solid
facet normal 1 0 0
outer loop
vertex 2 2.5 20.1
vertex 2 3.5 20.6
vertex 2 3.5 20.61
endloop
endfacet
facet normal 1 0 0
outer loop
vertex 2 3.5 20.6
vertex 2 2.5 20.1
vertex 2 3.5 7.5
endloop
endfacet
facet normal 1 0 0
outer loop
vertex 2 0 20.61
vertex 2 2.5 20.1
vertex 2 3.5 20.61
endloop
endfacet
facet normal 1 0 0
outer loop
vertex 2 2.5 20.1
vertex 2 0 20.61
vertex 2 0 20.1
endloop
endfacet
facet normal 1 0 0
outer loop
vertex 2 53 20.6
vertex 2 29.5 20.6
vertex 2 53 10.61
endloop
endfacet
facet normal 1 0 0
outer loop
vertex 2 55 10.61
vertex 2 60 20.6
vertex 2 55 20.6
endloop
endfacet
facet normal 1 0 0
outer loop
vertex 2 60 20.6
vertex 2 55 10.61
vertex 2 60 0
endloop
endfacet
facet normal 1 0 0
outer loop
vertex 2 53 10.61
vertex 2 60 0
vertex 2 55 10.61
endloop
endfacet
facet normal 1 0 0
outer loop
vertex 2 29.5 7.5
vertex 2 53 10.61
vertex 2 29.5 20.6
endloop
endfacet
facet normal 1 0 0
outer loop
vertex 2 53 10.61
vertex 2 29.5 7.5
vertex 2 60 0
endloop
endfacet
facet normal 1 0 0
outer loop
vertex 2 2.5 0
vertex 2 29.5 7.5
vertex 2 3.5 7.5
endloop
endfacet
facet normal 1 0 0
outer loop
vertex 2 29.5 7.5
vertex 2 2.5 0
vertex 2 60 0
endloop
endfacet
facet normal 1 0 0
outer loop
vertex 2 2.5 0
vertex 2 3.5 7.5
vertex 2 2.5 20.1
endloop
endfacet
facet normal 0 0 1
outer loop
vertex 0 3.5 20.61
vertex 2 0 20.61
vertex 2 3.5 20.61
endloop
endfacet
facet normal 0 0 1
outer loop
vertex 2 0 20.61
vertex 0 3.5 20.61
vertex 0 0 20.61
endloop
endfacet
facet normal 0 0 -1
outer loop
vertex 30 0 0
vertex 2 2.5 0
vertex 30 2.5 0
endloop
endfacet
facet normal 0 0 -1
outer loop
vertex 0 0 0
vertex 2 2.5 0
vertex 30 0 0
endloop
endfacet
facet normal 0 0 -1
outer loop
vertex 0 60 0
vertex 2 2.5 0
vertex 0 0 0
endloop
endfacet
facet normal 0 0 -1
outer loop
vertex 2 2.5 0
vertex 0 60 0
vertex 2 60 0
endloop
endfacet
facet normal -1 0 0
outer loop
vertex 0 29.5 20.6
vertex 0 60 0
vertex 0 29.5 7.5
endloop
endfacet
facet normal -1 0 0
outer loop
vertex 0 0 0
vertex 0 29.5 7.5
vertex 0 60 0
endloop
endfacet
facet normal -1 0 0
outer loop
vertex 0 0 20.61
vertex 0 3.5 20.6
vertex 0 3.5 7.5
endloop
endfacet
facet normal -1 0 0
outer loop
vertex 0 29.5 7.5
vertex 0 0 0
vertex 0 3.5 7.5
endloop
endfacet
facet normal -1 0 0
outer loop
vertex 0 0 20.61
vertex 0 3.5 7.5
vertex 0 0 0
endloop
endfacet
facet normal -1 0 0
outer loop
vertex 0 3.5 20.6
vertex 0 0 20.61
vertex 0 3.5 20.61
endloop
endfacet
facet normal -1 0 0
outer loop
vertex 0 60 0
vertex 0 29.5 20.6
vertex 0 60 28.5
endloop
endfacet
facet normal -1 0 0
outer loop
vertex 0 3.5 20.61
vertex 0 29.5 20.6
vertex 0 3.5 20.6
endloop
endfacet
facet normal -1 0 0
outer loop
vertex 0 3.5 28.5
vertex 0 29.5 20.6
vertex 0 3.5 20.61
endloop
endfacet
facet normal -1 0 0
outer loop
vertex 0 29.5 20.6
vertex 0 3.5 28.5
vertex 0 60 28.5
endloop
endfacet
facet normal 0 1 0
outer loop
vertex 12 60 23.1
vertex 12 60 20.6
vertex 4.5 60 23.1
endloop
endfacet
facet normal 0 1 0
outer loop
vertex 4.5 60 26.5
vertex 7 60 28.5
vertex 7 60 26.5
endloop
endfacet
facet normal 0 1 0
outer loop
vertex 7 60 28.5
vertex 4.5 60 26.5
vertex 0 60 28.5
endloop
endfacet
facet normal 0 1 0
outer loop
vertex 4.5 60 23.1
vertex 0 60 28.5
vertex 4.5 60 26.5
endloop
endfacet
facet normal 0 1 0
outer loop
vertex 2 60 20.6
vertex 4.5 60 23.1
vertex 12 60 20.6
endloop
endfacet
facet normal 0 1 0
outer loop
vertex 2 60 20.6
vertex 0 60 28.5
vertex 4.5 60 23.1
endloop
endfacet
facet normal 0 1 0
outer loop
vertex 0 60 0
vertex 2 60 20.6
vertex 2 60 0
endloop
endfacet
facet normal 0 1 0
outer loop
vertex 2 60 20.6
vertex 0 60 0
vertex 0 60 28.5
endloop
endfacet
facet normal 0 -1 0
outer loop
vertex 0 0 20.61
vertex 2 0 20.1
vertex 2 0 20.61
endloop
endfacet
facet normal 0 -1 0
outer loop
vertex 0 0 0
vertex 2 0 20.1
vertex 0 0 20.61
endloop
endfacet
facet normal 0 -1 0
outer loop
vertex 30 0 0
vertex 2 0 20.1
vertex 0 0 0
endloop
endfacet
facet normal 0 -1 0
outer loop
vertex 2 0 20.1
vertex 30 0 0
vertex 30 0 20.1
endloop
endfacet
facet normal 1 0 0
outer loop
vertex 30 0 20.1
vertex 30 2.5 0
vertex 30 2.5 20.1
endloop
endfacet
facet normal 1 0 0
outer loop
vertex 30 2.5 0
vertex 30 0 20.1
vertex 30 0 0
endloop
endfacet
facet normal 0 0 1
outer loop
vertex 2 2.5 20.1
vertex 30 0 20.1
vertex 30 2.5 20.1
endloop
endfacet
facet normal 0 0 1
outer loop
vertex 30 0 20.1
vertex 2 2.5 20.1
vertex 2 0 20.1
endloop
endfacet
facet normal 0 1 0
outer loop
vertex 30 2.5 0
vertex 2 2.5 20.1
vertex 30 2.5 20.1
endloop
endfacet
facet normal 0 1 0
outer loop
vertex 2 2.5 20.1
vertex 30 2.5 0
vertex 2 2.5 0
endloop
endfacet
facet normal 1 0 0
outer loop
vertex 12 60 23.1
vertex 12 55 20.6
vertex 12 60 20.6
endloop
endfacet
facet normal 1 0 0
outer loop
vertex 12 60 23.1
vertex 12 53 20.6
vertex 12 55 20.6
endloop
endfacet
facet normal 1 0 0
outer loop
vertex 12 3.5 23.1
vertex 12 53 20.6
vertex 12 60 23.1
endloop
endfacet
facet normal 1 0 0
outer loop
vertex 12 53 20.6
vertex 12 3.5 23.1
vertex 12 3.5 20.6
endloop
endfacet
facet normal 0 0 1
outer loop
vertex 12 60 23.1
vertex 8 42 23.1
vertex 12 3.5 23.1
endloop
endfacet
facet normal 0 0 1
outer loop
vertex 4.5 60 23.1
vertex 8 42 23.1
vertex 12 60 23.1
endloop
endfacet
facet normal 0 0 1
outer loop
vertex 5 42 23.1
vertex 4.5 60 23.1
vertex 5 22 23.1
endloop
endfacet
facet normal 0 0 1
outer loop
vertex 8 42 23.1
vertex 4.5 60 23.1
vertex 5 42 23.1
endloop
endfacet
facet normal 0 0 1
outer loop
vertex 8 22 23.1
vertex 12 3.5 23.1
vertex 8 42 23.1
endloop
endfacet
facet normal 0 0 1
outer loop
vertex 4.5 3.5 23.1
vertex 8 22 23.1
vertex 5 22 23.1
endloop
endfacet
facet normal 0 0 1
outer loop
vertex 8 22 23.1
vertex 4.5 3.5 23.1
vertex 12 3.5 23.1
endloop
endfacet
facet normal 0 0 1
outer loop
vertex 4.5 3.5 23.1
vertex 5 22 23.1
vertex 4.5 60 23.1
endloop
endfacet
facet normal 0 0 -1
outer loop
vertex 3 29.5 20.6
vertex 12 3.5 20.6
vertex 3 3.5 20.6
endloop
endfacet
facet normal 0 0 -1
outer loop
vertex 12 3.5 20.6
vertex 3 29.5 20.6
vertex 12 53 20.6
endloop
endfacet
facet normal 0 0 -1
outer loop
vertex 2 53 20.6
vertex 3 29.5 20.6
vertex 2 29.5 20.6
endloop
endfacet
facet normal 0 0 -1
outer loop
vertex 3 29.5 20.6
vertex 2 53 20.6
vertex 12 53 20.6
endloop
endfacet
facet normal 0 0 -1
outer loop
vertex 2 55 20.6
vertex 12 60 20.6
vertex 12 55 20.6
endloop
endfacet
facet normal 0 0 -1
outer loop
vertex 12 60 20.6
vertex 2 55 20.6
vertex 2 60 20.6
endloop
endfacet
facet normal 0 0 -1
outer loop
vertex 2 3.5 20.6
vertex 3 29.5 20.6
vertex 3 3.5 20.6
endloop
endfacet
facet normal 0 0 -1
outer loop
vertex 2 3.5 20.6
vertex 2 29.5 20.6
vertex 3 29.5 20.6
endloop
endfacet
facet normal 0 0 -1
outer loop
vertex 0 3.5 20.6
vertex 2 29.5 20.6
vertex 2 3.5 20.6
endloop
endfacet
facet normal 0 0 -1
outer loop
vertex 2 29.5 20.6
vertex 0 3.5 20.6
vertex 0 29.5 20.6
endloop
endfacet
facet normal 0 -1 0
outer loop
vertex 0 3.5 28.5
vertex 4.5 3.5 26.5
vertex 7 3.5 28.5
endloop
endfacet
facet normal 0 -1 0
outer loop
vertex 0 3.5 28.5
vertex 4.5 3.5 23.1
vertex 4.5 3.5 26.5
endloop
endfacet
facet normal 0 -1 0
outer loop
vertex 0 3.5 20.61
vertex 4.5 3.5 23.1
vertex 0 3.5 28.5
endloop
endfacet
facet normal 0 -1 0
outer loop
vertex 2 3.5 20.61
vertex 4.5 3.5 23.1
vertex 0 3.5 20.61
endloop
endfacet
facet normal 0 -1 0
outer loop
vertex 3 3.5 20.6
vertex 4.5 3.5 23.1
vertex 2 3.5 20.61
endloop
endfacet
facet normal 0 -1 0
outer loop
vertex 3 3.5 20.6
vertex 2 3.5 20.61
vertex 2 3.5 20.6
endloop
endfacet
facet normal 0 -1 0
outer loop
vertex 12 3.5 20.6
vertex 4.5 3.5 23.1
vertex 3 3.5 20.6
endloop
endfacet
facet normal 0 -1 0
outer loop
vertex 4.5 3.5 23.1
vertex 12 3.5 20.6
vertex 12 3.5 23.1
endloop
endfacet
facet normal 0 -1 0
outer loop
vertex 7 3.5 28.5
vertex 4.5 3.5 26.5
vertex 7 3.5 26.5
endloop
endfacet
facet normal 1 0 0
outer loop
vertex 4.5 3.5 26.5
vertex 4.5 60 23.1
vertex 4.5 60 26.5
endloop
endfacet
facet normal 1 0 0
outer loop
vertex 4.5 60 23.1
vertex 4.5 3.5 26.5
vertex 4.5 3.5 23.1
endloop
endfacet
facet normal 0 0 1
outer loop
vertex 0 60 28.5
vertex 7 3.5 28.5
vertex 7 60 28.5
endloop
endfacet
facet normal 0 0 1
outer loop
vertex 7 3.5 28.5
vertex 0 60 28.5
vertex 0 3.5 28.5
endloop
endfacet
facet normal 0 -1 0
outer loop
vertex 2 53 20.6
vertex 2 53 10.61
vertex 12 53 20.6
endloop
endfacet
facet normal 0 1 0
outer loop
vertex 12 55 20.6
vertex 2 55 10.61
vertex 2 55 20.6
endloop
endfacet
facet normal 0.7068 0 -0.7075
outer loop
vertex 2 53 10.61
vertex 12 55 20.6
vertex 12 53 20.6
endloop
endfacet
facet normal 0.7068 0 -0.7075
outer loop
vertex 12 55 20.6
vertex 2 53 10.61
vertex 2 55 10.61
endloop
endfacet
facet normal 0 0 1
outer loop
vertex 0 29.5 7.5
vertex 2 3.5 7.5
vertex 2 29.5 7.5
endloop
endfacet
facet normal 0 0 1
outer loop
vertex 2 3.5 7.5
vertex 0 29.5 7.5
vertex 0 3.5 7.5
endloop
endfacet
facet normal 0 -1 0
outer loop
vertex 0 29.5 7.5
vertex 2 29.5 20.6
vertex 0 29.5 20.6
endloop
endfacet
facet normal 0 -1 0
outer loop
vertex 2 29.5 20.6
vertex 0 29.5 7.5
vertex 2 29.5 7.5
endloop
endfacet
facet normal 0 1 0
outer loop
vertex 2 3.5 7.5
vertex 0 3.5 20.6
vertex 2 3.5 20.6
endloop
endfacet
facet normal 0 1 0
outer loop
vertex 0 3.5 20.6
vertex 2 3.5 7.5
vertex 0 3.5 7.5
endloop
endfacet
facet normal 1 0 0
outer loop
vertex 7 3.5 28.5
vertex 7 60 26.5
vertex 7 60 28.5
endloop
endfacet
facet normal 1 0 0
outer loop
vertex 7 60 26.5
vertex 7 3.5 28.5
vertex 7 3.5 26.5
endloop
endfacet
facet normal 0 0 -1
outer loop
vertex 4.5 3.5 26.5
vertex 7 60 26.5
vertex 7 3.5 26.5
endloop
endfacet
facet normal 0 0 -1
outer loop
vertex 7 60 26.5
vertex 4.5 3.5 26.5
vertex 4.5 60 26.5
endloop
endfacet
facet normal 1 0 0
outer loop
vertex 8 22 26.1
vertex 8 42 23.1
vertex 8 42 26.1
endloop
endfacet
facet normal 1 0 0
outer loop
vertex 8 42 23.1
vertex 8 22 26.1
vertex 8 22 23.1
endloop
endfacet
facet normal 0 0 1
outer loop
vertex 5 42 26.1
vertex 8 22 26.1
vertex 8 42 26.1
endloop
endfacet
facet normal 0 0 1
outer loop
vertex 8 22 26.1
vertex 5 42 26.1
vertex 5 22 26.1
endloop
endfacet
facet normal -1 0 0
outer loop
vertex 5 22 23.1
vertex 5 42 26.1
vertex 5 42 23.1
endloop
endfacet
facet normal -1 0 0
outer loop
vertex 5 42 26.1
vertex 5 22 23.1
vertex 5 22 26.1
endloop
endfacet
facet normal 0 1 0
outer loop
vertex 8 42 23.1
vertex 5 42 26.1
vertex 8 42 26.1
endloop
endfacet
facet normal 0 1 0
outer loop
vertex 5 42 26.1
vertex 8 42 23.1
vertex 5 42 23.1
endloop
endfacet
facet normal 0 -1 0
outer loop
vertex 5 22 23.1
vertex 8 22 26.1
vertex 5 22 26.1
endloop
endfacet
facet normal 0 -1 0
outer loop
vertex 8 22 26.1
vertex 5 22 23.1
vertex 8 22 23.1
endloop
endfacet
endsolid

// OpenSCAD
// file: _review.scad
// Shared by the review protos: the colours of a before/after pair.  The part in a neutral grey-blue, the
// geometry a proposal changes in the accent, the parts it mates with in a translucent grey.
NEUTRAL = "#b9c6d6";
ACCENT = "#ff7a1a";
MATE = "#6f7782";
MATE_A = 0.45;
PCB = "#2f6f4f";
module part() color(NEUTRAL) children();
module changed() color(ACCENT) children();
module mate(a = MATE_A) color(MATE, a) children();
// main file
// Review proto (not a part): a tray's left guide seen as a section (a 60 mm slice behind the fascia, front
// view), with the drawer's flange in it.  Today the lip's underside is a flat 2.5 mm shelf in the air along
// the whole tray, and the ledge's first 48 mm have no gusset (the row cable's window skips the ones at y 5
// and 29).  Proposed (accent): the lip's underside at 45° from its tip (the tip keeps the flange's 0.4 mm),
// a gusset at y 10, the fascia raised under the ledge.  docs/printed-parts-review.md › Tray.
//
//   openscad -D 'VIEW="today"' -o tray_guide_today.png mechanical/review/proto/tray_guide.scad
include <_review.scad>
VIEW = "today";
WALL = 2; LEDGE_X = 12; LEDGE_T = 2.5; LEDGE_Z = 23.1;
GUIDE_WALL_T = 4.5; LIP_Z = 3.4; LIP_T = 2.0; LIP_X = 7;
WALL_H = 20.1; FASCIA = 2.5; L = 60;
GUSSET_T = 2; EPS = 0.01;
FLANGE = [3, 3];
OVER = LIP_X - GUIDE_WALL_T;                // the lip's overhang beyond the guide wall: 2.5

module gusset(y) translate([0, y, LEDGE_Z - LEDGE_T]) rotate([90, 0, 0]) mirror([0, 0, 1])
    linear_extrude(GUSSET_T) polygon([[WALL - EPS, 0], [LEDGE_X, 0], [WALL - EPS, -(LEDGE_X - WALL)]]);
module jumper_window() translate([-1, 3.5, 7.5]) cube([WALL + 2, 26, LEDGE_Z - LEDGE_T - 7.5]);
module flange() mate(0.8) translate([GUIDE_WALL_T + 0.5, 22, LEDGE_Z]) cube([FLANGE[0], 20, FLANGE[1]]);   // the drawer's flange

module body() difference() {
    union() {
        cube([WALL, L, LEDGE_Z - LEDGE_T + EPS]);                                   // side wall up to the ledge
        cube([30, FASCIA, WALL_H]);                                                 // 30 mm of fascia
        translate([0, FASCIA + 1, LEDGE_Z - LEDGE_T]) cube([LEDGE_X, L - FASCIA - 1, LEDGE_T]);   // the ledge
        translate([0, FASCIA + 1, LEDGE_Z]) cube([GUIDE_WALL_T, L - FASCIA - 1, LIP_Z + LIP_T + (VIEW == "today" ? 0 : OVER)]);   // guide wall
        gusset(53);
    }
    jumper_window();
}
module lip_today() translate([GUIDE_WALL_T - EPS, FASCIA + 1, LEDGE_Z + LIP_Z]) cube([OVER + EPS, L - FASCIA - 1, LIP_T]);
// the lip rebuilt: 2 mm at the tip, its underside rising at 45° to the guide wall
module lip_45() translate([GUIDE_WALL_T - EPS, FASCIA + 1, LEDGE_Z + LIP_Z]) rotate([90, 0, 90]) linear_extrude(OVER + EPS)
    polygon([[0, OVER], [L - FASCIA - 1, OVER], [L - FASCIA - 1, OVER + LIP_T], [0, OVER + LIP_T]]);
module lip_45_wedge() translate([GUIDE_WALL_T - EPS, FASCIA + 1, LEDGE_Z + LIP_Z]) rotate([90, 0, 0]) mirror([0, 0, 1]) linear_extrude(L - FASCIA - 1)
    polygon([[0, 0], [OVER + EPS, OVER + EPS], [OVER + EPS, OVER + LIP_T], [0, OVER + LIP_T]]);
module fascia_raised() translate([0, 0, WALL_H - EPS]) cube([LEDGE_X, FASCIA, LEDGE_Z - LEDGE_T - WALL_H + EPS]);

if (VIEW == "today") { part() { body(); lip_today(); } flange(); }
else { part() body(); changed() { lip_45(); lip_45_wedge(); gusset(10); fascia_raised(); } flange(); }
